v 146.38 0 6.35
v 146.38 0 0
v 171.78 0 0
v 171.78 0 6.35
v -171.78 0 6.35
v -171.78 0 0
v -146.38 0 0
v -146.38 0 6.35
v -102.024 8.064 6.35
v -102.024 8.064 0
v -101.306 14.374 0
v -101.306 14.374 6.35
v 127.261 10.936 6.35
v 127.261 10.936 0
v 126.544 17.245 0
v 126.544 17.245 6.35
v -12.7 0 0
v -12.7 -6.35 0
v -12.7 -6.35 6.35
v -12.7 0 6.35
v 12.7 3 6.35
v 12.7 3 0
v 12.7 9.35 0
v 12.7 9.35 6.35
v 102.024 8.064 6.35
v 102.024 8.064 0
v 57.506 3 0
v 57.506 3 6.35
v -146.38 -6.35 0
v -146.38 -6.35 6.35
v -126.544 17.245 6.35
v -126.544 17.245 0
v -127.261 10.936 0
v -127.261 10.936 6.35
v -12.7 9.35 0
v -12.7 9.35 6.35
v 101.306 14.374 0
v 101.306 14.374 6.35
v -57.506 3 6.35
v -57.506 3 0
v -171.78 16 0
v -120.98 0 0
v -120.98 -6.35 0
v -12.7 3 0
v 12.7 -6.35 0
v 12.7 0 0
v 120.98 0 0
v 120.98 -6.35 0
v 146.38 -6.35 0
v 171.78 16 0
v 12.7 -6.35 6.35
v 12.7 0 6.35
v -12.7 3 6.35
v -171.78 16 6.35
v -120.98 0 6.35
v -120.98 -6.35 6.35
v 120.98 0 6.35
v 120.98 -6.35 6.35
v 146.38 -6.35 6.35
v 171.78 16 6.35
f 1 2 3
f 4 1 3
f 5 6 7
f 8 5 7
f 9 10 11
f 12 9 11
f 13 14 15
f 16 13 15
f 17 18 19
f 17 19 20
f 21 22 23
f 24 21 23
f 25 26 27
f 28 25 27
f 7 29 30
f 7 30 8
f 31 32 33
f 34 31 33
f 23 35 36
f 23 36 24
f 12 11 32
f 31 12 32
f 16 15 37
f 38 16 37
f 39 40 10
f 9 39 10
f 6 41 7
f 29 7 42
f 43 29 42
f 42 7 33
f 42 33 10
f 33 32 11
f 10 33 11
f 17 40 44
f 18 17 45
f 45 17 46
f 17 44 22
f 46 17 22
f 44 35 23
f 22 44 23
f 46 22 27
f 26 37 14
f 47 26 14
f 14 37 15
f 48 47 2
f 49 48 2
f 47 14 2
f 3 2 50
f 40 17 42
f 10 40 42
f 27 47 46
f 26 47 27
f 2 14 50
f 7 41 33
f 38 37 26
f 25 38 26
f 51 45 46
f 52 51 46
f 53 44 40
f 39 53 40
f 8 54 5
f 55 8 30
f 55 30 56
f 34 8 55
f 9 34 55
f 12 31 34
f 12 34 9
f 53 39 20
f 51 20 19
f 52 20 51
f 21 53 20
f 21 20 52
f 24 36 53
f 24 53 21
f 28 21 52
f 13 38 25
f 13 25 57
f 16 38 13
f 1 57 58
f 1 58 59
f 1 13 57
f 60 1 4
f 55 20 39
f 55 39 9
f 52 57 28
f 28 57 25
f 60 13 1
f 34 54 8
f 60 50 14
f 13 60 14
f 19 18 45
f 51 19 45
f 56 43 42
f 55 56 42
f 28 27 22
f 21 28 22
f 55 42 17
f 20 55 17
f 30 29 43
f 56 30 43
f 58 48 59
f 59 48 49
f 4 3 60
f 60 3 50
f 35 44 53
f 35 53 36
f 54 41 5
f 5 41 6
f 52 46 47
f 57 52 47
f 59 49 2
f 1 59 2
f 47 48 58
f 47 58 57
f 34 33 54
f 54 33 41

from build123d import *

# Parameters (mm, degrees)
F0_W     = 25.4
F0_H     = 6.35
F1_DEPTH = 6.35


with BuildPart() as f1:
    # F0 (on Top) → F1 (new body)
    with BuildSketch(Plane.XY):
        Polygon((-171.779727, 16), (-171.779727, 0), (-146.379727, 0), (-120.979727, 0), (-12.7, 0), (12.7, 0), (120.979727, 0), (146.379727, 0), (171.779727, 0), (171.779727, 16), (127.261273, 10.935512), (102.024054, 8.064488), (57.5056, 3), (12.7, 3), (-12.7, 3), (-57.5056, 3), (-102.024054, 8.064488), (-127.261273, 10.935512), align=None)
        with Locations((-133.679727, -3.175)):
            Rectangle(F0_W, F0_H)
        Polygon((-126.543517, 17.244817), (-127.261273, 10.935512), (-102.024054, 8.064488), (-101.306298, 14.373792), align=None)
        with Locations((0, -3.175)):
            Rectangle(F0_W, F0_H)
        with Locations((133.679727, -3.175)):
            Rectangle(F0_W, F0_H)
        with Locations((0, 6.175)):
            Rectangle(F0_W, F0_H)
        Polygon((101.306298, 14.373792), (102.024054, 8.064488), (127.261273, 10.935512), (126.543517, 17.244817), align=None)
    extrude(amount=F1_DEPTH)


solid = f1.part
